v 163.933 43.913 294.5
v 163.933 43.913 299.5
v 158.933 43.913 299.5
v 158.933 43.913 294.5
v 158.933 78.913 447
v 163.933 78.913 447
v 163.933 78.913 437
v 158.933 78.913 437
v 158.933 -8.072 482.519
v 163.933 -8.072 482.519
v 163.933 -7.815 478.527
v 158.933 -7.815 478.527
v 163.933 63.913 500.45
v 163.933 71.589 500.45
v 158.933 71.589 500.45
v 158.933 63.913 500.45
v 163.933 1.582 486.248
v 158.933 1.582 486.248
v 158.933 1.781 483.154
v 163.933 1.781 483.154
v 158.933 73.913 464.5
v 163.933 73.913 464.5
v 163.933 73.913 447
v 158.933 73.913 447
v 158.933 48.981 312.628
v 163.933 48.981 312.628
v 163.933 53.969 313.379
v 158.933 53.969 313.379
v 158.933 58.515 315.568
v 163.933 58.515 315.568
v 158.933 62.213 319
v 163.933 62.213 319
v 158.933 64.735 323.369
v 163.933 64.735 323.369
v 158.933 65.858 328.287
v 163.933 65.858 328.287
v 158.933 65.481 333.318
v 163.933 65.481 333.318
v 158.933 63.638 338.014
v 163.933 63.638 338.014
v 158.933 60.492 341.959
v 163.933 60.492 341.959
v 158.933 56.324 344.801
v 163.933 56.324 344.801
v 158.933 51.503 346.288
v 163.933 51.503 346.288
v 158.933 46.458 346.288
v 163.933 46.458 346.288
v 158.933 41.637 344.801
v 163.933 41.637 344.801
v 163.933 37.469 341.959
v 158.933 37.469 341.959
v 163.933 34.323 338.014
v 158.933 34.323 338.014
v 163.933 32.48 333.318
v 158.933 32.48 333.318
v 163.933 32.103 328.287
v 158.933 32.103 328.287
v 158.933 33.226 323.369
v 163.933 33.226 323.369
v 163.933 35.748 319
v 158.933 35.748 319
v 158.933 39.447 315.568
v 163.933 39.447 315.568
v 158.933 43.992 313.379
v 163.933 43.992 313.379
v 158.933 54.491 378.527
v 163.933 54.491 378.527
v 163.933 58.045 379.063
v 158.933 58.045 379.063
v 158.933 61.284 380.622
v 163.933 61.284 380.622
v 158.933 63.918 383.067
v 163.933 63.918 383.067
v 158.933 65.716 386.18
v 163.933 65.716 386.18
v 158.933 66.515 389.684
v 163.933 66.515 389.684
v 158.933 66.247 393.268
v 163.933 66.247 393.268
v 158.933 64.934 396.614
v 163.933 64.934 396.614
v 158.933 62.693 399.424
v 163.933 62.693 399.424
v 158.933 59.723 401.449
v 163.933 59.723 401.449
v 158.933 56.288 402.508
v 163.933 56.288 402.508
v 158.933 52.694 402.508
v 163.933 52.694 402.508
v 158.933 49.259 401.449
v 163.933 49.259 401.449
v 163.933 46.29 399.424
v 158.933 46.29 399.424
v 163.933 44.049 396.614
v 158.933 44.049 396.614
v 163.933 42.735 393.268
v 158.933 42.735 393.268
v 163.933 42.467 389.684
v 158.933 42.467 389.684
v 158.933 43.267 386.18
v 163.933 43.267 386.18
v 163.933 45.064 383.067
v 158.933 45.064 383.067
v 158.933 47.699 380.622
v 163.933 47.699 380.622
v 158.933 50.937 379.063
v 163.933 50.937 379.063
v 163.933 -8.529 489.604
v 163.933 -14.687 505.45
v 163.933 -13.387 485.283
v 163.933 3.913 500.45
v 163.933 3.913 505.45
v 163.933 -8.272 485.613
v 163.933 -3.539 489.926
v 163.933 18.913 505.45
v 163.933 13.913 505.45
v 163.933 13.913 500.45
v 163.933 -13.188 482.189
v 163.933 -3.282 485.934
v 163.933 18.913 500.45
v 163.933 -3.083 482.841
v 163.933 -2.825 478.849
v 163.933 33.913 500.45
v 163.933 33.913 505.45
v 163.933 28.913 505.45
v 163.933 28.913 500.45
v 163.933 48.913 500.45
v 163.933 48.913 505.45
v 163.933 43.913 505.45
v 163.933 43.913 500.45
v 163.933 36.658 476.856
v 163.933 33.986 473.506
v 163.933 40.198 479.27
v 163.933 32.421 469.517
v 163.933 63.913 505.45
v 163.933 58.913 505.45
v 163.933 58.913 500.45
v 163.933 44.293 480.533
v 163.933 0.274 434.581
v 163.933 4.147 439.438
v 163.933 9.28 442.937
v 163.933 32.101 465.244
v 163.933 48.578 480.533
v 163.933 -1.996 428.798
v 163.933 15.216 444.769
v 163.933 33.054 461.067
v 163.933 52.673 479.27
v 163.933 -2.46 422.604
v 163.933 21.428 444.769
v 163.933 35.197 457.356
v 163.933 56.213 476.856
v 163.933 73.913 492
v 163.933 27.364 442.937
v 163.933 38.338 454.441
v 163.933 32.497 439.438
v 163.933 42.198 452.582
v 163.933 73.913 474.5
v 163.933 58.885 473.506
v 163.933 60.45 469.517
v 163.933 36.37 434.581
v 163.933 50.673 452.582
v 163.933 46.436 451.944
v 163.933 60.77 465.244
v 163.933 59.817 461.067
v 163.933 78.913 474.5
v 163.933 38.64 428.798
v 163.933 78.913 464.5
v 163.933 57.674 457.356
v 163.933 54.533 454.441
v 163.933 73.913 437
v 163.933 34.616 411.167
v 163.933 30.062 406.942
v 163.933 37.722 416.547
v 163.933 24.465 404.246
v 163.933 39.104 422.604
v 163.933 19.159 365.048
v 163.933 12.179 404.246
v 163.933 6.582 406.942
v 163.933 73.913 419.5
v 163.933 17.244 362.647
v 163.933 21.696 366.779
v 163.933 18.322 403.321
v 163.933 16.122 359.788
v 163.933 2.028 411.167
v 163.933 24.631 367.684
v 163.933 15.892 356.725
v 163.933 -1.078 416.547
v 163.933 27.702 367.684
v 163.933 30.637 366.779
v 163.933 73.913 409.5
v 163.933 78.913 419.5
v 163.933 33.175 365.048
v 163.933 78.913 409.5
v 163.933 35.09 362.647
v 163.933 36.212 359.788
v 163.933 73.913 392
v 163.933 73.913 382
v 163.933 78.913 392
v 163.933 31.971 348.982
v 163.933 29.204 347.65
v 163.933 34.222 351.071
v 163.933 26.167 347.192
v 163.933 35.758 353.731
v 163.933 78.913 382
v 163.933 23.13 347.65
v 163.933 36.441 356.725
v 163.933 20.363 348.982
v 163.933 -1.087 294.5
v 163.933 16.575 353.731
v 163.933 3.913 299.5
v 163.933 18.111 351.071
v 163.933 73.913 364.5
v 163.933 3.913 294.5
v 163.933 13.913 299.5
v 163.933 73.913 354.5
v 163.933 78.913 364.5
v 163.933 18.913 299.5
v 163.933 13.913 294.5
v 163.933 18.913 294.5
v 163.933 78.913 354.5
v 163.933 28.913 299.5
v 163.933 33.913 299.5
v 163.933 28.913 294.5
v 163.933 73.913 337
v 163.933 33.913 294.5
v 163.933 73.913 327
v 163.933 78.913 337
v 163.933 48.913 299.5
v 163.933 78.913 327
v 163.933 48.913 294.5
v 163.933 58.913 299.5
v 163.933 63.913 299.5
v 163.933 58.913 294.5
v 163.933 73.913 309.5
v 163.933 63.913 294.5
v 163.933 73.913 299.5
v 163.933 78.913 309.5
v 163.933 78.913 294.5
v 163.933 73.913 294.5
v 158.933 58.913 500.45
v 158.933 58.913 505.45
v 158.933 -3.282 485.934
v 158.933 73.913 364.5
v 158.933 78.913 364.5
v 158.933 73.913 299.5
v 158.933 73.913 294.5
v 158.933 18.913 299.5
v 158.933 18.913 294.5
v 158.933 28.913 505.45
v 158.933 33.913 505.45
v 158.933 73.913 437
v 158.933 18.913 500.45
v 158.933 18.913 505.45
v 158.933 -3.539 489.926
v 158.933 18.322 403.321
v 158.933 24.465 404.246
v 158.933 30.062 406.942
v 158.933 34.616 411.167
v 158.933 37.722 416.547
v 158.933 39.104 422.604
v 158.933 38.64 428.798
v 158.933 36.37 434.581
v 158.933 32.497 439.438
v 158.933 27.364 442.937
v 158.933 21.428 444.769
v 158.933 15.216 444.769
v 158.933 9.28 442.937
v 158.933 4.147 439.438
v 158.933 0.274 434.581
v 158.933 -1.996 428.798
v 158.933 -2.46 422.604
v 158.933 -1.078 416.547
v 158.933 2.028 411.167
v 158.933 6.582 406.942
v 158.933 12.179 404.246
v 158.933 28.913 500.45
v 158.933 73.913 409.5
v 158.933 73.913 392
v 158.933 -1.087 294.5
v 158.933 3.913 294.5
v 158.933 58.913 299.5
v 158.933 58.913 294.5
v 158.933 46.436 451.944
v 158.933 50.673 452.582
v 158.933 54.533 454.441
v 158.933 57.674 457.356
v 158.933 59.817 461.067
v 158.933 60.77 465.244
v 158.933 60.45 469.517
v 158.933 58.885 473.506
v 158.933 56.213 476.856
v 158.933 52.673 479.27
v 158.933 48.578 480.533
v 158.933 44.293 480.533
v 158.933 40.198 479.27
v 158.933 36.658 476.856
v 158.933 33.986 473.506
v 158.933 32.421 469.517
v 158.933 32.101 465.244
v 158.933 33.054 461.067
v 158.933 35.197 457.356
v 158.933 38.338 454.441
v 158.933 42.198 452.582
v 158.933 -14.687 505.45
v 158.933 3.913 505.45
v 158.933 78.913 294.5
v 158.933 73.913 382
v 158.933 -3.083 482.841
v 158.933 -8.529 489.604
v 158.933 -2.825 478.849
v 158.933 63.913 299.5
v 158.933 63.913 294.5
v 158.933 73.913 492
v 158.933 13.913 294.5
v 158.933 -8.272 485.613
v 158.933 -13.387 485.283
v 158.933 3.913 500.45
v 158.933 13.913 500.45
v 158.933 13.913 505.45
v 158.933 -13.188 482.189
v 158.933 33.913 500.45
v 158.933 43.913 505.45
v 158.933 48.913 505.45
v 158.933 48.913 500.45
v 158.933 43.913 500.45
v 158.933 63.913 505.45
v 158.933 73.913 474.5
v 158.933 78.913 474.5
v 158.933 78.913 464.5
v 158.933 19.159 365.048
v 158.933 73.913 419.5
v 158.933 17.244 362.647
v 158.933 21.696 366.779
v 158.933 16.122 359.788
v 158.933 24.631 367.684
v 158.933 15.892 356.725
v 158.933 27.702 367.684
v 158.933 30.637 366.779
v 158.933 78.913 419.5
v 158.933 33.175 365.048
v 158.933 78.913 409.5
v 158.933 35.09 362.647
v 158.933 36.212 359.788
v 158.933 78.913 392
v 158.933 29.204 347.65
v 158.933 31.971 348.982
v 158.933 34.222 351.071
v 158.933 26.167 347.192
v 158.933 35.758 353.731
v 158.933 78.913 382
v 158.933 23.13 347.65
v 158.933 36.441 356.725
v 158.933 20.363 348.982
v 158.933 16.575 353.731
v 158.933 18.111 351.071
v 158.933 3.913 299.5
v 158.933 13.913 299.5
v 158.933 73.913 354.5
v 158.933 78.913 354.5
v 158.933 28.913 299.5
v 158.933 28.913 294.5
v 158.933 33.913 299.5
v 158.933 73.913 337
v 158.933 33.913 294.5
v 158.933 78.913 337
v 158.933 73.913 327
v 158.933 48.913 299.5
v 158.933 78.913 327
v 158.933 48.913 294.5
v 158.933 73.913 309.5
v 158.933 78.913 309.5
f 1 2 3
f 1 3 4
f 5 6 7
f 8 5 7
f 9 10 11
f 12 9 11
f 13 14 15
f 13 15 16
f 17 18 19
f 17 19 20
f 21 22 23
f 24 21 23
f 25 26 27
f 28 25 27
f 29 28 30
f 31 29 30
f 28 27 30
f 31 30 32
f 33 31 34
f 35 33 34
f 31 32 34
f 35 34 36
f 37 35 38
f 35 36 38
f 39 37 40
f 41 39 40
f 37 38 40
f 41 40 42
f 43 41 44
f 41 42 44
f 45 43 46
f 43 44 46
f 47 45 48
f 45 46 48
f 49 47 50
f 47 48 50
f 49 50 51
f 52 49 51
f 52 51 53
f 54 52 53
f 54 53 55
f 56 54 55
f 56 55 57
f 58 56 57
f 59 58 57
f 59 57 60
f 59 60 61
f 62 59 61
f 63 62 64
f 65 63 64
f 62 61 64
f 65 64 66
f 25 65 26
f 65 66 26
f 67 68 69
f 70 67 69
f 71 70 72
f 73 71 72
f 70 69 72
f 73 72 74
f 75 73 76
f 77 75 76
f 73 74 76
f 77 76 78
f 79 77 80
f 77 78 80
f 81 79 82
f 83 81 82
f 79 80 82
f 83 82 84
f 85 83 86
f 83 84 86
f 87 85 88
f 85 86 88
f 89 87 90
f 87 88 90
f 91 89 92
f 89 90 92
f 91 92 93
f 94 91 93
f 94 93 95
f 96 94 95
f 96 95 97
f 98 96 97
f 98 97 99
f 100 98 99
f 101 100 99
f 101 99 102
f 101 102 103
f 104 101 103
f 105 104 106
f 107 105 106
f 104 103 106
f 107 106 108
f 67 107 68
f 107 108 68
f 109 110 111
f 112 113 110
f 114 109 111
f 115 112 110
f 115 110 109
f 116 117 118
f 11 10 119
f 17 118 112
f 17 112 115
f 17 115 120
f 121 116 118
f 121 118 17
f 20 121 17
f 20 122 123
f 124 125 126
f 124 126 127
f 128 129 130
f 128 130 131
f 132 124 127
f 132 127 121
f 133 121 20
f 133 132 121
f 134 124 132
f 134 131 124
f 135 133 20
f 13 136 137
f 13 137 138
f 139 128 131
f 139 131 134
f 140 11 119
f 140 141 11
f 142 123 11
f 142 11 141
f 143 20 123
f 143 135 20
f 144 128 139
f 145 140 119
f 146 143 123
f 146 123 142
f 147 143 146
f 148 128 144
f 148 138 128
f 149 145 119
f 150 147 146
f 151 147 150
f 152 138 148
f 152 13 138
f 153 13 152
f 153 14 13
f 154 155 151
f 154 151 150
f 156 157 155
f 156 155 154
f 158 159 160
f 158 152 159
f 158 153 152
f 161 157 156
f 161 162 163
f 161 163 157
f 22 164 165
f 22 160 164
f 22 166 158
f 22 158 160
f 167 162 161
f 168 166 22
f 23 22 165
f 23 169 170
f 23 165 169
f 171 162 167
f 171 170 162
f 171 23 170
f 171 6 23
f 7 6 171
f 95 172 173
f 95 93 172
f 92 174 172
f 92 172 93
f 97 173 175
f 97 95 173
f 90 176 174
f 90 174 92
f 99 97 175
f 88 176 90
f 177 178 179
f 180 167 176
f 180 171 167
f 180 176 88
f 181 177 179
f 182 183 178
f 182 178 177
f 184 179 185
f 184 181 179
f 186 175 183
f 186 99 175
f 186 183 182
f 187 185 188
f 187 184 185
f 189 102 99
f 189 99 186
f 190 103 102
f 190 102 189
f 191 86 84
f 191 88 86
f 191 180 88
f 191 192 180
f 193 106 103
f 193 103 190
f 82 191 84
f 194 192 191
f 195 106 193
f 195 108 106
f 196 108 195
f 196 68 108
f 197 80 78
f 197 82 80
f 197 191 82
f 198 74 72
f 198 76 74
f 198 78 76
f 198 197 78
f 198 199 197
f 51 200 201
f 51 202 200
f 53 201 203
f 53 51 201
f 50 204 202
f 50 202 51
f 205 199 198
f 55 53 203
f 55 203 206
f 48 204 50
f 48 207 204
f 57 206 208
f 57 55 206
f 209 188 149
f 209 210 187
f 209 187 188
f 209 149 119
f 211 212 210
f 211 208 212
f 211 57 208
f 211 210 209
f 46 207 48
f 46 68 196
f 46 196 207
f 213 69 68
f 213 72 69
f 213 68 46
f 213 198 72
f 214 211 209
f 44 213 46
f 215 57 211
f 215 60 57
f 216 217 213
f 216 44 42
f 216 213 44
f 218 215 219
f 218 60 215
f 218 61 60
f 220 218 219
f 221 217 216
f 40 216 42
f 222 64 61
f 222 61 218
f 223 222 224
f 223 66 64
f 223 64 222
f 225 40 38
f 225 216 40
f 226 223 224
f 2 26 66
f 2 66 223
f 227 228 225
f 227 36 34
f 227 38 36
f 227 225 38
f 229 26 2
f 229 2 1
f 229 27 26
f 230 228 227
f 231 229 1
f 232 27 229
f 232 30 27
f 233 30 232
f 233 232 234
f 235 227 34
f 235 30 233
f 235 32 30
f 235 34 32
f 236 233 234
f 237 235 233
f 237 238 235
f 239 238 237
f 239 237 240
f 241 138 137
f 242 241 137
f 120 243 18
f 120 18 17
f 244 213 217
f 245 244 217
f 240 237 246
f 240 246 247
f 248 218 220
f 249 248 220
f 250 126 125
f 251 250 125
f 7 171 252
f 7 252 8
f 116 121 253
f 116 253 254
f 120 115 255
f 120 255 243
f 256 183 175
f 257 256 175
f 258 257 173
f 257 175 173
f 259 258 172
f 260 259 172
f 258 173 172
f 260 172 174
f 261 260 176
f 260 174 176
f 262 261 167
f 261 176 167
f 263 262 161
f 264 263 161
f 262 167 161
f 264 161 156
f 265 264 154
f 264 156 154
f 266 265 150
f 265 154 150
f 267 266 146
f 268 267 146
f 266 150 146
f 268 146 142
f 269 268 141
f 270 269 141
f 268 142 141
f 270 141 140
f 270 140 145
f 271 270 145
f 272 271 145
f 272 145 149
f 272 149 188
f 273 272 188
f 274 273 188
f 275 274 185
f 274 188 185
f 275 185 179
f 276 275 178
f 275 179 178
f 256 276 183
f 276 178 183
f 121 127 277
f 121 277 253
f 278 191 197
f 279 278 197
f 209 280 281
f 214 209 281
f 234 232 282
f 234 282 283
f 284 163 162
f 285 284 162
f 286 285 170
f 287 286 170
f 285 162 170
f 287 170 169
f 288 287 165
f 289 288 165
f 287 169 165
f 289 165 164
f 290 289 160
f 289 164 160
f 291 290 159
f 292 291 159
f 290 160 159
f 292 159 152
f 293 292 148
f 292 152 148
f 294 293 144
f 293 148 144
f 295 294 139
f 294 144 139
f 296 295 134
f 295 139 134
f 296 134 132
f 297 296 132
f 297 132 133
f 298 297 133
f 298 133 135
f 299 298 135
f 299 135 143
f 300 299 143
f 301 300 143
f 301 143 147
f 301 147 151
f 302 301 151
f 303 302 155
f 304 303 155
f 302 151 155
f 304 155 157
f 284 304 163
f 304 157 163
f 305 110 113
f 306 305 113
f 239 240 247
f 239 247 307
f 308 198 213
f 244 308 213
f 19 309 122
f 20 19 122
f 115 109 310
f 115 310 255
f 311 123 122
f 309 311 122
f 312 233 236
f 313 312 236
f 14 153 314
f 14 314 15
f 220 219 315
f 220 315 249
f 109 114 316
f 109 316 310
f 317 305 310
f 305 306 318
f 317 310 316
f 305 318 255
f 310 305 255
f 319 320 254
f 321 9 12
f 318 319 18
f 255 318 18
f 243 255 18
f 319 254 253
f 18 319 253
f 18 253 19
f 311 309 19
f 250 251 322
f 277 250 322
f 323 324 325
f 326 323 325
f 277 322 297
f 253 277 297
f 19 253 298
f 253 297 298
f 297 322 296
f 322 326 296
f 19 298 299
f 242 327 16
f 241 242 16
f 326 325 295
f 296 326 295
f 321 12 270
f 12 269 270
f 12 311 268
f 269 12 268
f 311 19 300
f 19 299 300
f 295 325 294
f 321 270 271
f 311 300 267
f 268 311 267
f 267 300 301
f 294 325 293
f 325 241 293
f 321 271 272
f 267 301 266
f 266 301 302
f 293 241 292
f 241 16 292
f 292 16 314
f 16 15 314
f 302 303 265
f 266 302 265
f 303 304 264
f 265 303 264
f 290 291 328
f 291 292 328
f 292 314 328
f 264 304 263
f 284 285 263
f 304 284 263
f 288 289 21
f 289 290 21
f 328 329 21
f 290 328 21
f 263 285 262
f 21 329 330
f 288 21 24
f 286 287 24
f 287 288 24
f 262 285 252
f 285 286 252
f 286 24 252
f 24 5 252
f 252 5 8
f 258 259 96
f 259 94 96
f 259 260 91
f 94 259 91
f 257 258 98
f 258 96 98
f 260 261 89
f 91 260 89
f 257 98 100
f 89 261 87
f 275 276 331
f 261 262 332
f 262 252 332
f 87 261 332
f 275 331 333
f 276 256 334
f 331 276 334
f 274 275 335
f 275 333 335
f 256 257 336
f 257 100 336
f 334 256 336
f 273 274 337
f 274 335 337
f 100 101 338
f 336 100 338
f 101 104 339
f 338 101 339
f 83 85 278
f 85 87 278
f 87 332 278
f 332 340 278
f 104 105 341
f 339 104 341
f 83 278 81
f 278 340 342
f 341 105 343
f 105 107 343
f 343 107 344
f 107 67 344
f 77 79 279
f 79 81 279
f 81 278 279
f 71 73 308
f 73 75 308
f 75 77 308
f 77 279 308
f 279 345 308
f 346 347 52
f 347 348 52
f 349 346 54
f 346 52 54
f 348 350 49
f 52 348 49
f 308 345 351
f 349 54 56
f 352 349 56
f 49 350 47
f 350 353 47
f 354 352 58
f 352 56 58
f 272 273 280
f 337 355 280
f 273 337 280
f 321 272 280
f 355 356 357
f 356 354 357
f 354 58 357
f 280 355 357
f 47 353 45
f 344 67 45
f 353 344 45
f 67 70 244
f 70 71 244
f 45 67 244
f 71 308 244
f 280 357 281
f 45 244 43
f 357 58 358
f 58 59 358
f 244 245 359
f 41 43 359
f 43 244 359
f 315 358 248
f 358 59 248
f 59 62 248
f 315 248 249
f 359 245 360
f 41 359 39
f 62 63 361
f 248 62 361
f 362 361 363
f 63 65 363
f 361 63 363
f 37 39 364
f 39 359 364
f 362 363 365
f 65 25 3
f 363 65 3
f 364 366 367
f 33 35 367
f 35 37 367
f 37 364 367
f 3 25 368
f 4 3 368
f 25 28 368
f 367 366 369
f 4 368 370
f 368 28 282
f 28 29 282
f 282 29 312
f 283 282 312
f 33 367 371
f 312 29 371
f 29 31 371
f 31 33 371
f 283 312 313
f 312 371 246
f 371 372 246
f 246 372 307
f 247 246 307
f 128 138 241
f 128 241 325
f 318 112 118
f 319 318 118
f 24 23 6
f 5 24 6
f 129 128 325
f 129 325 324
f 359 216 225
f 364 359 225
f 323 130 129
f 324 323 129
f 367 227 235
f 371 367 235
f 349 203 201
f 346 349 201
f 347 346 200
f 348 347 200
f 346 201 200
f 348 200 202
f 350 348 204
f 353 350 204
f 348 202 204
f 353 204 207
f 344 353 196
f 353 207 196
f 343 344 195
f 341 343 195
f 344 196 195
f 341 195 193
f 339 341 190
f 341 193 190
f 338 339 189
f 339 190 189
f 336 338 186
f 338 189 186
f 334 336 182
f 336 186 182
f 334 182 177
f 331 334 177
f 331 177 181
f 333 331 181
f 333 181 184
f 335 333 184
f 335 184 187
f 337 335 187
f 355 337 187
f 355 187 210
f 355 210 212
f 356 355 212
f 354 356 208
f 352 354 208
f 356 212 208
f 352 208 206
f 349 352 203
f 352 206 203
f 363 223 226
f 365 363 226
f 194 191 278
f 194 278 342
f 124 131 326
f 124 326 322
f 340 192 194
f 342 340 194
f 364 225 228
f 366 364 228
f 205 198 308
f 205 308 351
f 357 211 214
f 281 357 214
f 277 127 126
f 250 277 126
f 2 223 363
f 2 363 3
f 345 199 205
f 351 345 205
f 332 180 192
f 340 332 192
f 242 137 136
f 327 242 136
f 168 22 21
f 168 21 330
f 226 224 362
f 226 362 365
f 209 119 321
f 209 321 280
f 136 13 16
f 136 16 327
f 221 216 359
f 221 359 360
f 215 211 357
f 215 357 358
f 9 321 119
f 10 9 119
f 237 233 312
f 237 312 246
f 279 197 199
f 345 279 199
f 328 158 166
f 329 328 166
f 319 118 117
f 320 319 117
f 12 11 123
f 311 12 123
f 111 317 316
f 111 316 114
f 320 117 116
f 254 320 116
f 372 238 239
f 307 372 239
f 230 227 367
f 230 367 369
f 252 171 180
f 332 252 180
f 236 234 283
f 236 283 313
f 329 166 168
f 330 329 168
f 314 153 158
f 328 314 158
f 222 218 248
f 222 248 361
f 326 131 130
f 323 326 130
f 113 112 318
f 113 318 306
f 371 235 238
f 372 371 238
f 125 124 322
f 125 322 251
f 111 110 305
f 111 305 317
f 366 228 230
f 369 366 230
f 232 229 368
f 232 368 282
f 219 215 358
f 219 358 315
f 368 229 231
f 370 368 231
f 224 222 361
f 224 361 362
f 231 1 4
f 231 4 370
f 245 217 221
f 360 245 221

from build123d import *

# Parameters (mm, degrees)
ESQUISSE1_W                = 210.950231097
ESQUISSE1_H                = 93.600386247
BOSS_EXTRU_1_DEPTH         = 5
ENL_V_MAT_EXTRU_1_DEPTH    = 5
ESQUISSE4_W                = 5
ESQUISSE4_H                = 10
ENL_V_MAT_EXTRU_2_DEPTH    = 5
R_P_TITION_LIN_AIRE1_COUNT = 5
R_P_TITION_LIN_AIRE1_PITCH = 15
ESQUISSE5_W                = 17.5
ESQUISSE5_H                = 5
ENL_V_MAT_EXTRU_3_DEPTH    = 5
R_P_TITION_LIN_AIRE2_COUNT = 7
R_P_TITION_LIN_AIRE2_PITCH = 27.5
ENL_V_MAT_EXTRU_4_DEPTH    = 5
ESQUISSE8_R                = 10.303452194
ESQUISSE8_R_2              = 16.92457318
ESQUISSE8_R_3              = 12.058004818
ESQUISSE8_R_4              = 20.840400714
ESQUISSE8_R_5              = 14.375020811
ENL_V_MAT_EXTRU_5_DEPTH    = 5
SYM_TRIE1_COPY_1_SKETCH_W  = 5
SYM_TRIE1_COPY_1_SKETCH_H  = 10
SYM_TRIE1_COPY_1_DEPTH     = 5
SYM_TRIE1_COPY_2_SKETCH_W  = 5
SYM_TRIE1_COPY_2_SKETCH_H  = 10
SYM_TRIE1_COPY_2_DEPTH     = 5
SYM_TRIE1_COPY_3_SKETCH_W  = 5
SYM_TRIE1_COPY_3_SKETCH_H  = 10
SYM_TRIE1_COPY_3_DEPTH     = 5
SYM_TRIE1_COPY_4_SKETCH_W  = 5
SYM_TRIE1_COPY_4_SKETCH_H  = 10
SYM_TRIE1_COPY_4_DEPTH     = 5
SYM_TRIE1_COPY_5_SKETCH_W  = 5
SYM_TRIE1_COPY_5_SKETCH_H  = 10
SYM_TRIE1_COPY_5_DEPTH     = 5
ESQUISSE9_W                = 5
ESQUISSE9_H                = 3.1
ENL_V_MAT_EXTRU_6_DEPTH    = 15
ENL_V_MAT_EXTRU_7_DEPTH    = 15


with BuildPart() as part:
    # Esquisse1 → Boss.-Extru.1 (new body)
    with BuildSketch(Plane(origin=(163.933470491, 0, 0), x_dir=(0, 0, -1), z_dir=(1, 0, 0))):
        with Locations((-399.975115549, 32.112736727)):
            Rectangle(ESQUISSE1_W, ESQUISSE1_H)
    extrude(amount=-BOSS_EXTRU_1_DEPTH)

    # Esquisse3 → Enlèv. mat.-Extru.1 (cut)
    with BuildSketch(Plane(origin=(163.933470491, 0, 0), x_dir=(0, 0, -1), z_dir=(1, 0, 0))):
        Polygon((-505.450231097, -14.687456397), (-294.5, -1.08707015), (-294.5, -1.14043518), (-294.5, -14.687456397), align=None)
    extrude(amount=-ENL_V_MAT_EXTRU_1_DEPTH, mode=Mode.SUBTRACT)

    # Esquisse4 → Enlèv. mat.-Extru.2 (cut)
    with BuildSketch(Plane(origin=(163.933470491, 0, 0), x_dir=(0, 0, -1), z_dir=(1, 0, 0))):
        with Locations((-297, 8.91292985)):
            Rectangle(ESQUISSE4_W, ESQUISSE4_H)
    enl_v_mat_extru_2 = extrude(amount=-ENL_V_MAT_EXTRU_2_DEPTH, mode=Mode.SUBTRACT)

    # Répétition linéaire1: Enlèv. mat.-Extru.2 ×5
    with Locations(*[(0, i * R_P_TITION_LIN_AIRE1_PITCH, 0) for i in range(1, R_P_TITION_LIN_AIRE1_COUNT)]):
        add(enl_v_mat_extru_2, mode=Mode.SUBTRACT)

    # Esquisse5 → Enlèv. mat.-Extru.3 (cut)
    with BuildSketch(Plane(origin=(163.933470491, 0, 0), x_dir=(0, 0, -1), z_dir=(1, 0, 0))):
        with Locations((-318.25, 76.41292985)):
            Rectangle(ESQUISSE5_W, ESQUISSE5_H)
    enl_v_mat_extru_3 = extrude(amount=-ENL_V_MAT_EXTRU_3_DEPTH, mode=Mode.SUBTRACT)

    # Répétition linéaire2: Enlèv. mat.-Extru.3 ×7
    with Locations(*[(0, 0, i * R_P_TITION_LIN_AIRE2_PITCH) for i in range(1, R_P_TITION_LIN_AIRE2_COUNT)]):
        add(enl_v_mat_extru_3, mode=Mode.SUBTRACT)

    # Esquisse6 → Enlèv. mat.-Extru.4 (cut)
    with BuildSketch(Plane(origin=(163.933470491, 0, 0), x_dir=(0, 0, -1), z_dir=(1, 0, 0))):
        Polygon((-492, 73.91292985), (-505.450231097, 70.214096677), (-505.450231097, 78.91292985), (-492, 78.91292985), align=None)
    extrude(amount=-ENL_V_MAT_EXTRU_4_DEPTH, mode=Mode.SUBTRACT)

    # Esquisse8 → Enlèv. mat.-Extru.5 (cut)
    with BuildSketch(Plane(origin=(163.933470491, 0, 0), x_dir=(0, 0, -1), z_dir=(1, 0, 0))):
        with Locations((-357.495437595, 26.166642192)):
            Circle(ESQUISSE8_R)
        with Locations((-329.552133235, 48.980591934)):
            Circle(ESQUISSE8_R_2)
        with Locations((-390.585162306, 54.491117128)):
            Circle(ESQUISSE8_R_3)
        with Locations((-424.160939117, 18.322009653)):
            Circle(ESQUISSE8_R_4)
        with Locations((-466.318690215, 46.435552099)):
            Circle(ESQUISSE8_R_5)
    extrude(amount=-ENL_V_MAT_EXTRU_5_DEPTH, mode=Mode.SUBTRACT)

    # Symétrie1 copy 1 sketch → Symétrie1 copy 1 (cut)
    with BuildSketch(Plane(origin=(163.933470491, 15, 799.950231097), x_dir=(0, 0, 1), z_dir=(1, 0, 0))):
        with Locations((-297, -8.91292985)):
            Rectangle(SYM_TRIE1_COPY_1_SKETCH_W, SYM_TRIE1_COPY_1_SKETCH_H)
    extrude(amount=-SYM_TRIE1_COPY_1_DEPTH, mode=Mode.SUBTRACT)

    # Symétrie1 copy 2 sketch → Symétrie1 copy 2 (cut)
    with BuildSketch(Plane(origin=(163.933470491, 30, 799.950231097), x_dir=(0, 0, 1), z_dir=(1, 0, 0))):
        with Locations((-297, -8.91292985)):
            Rectangle(SYM_TRIE1_COPY_2_SKETCH_W, SYM_TRIE1_COPY_2_SKETCH_H)
    extrude(amount=-SYM_TRIE1_COPY_2_DEPTH, mode=Mode.SUBTRACT)

    # Symétrie1 copy 3 sketch → Symétrie1 copy 3 (cut)
    with BuildSketch(Plane(origin=(163.933470491, 45, 799.950231097), x_dir=(0, 0, 1), z_dir=(1, 0, 0))):
        with Locations((-297, -8.91292985)):
            Rectangle(SYM_TRIE1_COPY_3_SKETCH_W, SYM_TRIE1_COPY_3_SKETCH_H)
    extrude(amount=-SYM_TRIE1_COPY_3_DEPTH, mode=Mode.SUBTRACT)

    # Symétrie1 copy 4 sketch → Symétrie1 copy 4 (cut)
    with BuildSketch(Plane(origin=(163.933470491, 60, 799.950231097), x_dir=(0, 0, 1), z_dir=(1, 0, 0))):
        with Locations((-297, -8.91292985)):
            Rectangle(SYM_TRIE1_COPY_4_SKETCH_W, SYM_TRIE1_COPY_4_SKETCH_H)
    extrude(amount=-SYM_TRIE1_COPY_4_DEPTH, mode=Mode.SUBTRACT)

    # Symétrie1 copy 5 sketch → Symétrie1 copy 5 (cut)
    with BuildSketch(Plane(origin=(163.933470491, 0, 799.950231097), x_dir=(0, 0, 1), z_dir=(1, 0, 0))):
        with Locations((-297, -8.91292985)):
            Rectangle(SYM_TRIE1_COPY_5_SKETCH_W, SYM_TRIE1_COPY_5_SKETCH_H)
    extrude(amount=-SYM_TRIE1_COPY_5_DEPTH, mode=Mode.SUBTRACT)

    # Esquisse9 → Enlèv. mat.-Extru.6 (cut)
    with BuildSketch(Plane(origin=(0, 17.825842347, 1.149267957), x_dir=(1, 0, 0), z_dir=(0, -0.9979281364682809, -0.06433843676173626))):
        with Locations((161.433470491, 483.588677553)):
            Rectangle(ESQUISSE9_W, ESQUISSE9_H)
    extrude(amount=-ENL_V_MAT_EXTRU_6_DEPTH, mode=Mode.SUBTRACT)

    # Esquisse10 → Enlèv. mat.-Extru.7 (cut)
    with BuildSketch(Plane(origin=(163.933470491, 0, 0), x_dir=(0, 0, -1), z_dir=(1, 0, 0))):
        Polygon((-485.612619151, -8.271594794), (-489.604331697, -8.528948541), (-489.926023881, -3.539307858), (-485.934311335, -3.281954111), align=None)
    enl_v_mat_extru_7 = extrude(amount=-ENL_V_MAT_EXTRU_7_DEPTH, mode=Mode.SUBTRACT)

    # Symétrie2: Enlèv. mat.-Extru.7 across plane
    add(enl_v_mat_extru_7.mirror(Plane(origin=(0, -31.113339549, 482.586747808), x_dir=(1, 0, 0), z_dir=(0, 0.06433843676173628, -0.997928136468281))), mode=Mode.SUBTRACT)


solid = part.part
